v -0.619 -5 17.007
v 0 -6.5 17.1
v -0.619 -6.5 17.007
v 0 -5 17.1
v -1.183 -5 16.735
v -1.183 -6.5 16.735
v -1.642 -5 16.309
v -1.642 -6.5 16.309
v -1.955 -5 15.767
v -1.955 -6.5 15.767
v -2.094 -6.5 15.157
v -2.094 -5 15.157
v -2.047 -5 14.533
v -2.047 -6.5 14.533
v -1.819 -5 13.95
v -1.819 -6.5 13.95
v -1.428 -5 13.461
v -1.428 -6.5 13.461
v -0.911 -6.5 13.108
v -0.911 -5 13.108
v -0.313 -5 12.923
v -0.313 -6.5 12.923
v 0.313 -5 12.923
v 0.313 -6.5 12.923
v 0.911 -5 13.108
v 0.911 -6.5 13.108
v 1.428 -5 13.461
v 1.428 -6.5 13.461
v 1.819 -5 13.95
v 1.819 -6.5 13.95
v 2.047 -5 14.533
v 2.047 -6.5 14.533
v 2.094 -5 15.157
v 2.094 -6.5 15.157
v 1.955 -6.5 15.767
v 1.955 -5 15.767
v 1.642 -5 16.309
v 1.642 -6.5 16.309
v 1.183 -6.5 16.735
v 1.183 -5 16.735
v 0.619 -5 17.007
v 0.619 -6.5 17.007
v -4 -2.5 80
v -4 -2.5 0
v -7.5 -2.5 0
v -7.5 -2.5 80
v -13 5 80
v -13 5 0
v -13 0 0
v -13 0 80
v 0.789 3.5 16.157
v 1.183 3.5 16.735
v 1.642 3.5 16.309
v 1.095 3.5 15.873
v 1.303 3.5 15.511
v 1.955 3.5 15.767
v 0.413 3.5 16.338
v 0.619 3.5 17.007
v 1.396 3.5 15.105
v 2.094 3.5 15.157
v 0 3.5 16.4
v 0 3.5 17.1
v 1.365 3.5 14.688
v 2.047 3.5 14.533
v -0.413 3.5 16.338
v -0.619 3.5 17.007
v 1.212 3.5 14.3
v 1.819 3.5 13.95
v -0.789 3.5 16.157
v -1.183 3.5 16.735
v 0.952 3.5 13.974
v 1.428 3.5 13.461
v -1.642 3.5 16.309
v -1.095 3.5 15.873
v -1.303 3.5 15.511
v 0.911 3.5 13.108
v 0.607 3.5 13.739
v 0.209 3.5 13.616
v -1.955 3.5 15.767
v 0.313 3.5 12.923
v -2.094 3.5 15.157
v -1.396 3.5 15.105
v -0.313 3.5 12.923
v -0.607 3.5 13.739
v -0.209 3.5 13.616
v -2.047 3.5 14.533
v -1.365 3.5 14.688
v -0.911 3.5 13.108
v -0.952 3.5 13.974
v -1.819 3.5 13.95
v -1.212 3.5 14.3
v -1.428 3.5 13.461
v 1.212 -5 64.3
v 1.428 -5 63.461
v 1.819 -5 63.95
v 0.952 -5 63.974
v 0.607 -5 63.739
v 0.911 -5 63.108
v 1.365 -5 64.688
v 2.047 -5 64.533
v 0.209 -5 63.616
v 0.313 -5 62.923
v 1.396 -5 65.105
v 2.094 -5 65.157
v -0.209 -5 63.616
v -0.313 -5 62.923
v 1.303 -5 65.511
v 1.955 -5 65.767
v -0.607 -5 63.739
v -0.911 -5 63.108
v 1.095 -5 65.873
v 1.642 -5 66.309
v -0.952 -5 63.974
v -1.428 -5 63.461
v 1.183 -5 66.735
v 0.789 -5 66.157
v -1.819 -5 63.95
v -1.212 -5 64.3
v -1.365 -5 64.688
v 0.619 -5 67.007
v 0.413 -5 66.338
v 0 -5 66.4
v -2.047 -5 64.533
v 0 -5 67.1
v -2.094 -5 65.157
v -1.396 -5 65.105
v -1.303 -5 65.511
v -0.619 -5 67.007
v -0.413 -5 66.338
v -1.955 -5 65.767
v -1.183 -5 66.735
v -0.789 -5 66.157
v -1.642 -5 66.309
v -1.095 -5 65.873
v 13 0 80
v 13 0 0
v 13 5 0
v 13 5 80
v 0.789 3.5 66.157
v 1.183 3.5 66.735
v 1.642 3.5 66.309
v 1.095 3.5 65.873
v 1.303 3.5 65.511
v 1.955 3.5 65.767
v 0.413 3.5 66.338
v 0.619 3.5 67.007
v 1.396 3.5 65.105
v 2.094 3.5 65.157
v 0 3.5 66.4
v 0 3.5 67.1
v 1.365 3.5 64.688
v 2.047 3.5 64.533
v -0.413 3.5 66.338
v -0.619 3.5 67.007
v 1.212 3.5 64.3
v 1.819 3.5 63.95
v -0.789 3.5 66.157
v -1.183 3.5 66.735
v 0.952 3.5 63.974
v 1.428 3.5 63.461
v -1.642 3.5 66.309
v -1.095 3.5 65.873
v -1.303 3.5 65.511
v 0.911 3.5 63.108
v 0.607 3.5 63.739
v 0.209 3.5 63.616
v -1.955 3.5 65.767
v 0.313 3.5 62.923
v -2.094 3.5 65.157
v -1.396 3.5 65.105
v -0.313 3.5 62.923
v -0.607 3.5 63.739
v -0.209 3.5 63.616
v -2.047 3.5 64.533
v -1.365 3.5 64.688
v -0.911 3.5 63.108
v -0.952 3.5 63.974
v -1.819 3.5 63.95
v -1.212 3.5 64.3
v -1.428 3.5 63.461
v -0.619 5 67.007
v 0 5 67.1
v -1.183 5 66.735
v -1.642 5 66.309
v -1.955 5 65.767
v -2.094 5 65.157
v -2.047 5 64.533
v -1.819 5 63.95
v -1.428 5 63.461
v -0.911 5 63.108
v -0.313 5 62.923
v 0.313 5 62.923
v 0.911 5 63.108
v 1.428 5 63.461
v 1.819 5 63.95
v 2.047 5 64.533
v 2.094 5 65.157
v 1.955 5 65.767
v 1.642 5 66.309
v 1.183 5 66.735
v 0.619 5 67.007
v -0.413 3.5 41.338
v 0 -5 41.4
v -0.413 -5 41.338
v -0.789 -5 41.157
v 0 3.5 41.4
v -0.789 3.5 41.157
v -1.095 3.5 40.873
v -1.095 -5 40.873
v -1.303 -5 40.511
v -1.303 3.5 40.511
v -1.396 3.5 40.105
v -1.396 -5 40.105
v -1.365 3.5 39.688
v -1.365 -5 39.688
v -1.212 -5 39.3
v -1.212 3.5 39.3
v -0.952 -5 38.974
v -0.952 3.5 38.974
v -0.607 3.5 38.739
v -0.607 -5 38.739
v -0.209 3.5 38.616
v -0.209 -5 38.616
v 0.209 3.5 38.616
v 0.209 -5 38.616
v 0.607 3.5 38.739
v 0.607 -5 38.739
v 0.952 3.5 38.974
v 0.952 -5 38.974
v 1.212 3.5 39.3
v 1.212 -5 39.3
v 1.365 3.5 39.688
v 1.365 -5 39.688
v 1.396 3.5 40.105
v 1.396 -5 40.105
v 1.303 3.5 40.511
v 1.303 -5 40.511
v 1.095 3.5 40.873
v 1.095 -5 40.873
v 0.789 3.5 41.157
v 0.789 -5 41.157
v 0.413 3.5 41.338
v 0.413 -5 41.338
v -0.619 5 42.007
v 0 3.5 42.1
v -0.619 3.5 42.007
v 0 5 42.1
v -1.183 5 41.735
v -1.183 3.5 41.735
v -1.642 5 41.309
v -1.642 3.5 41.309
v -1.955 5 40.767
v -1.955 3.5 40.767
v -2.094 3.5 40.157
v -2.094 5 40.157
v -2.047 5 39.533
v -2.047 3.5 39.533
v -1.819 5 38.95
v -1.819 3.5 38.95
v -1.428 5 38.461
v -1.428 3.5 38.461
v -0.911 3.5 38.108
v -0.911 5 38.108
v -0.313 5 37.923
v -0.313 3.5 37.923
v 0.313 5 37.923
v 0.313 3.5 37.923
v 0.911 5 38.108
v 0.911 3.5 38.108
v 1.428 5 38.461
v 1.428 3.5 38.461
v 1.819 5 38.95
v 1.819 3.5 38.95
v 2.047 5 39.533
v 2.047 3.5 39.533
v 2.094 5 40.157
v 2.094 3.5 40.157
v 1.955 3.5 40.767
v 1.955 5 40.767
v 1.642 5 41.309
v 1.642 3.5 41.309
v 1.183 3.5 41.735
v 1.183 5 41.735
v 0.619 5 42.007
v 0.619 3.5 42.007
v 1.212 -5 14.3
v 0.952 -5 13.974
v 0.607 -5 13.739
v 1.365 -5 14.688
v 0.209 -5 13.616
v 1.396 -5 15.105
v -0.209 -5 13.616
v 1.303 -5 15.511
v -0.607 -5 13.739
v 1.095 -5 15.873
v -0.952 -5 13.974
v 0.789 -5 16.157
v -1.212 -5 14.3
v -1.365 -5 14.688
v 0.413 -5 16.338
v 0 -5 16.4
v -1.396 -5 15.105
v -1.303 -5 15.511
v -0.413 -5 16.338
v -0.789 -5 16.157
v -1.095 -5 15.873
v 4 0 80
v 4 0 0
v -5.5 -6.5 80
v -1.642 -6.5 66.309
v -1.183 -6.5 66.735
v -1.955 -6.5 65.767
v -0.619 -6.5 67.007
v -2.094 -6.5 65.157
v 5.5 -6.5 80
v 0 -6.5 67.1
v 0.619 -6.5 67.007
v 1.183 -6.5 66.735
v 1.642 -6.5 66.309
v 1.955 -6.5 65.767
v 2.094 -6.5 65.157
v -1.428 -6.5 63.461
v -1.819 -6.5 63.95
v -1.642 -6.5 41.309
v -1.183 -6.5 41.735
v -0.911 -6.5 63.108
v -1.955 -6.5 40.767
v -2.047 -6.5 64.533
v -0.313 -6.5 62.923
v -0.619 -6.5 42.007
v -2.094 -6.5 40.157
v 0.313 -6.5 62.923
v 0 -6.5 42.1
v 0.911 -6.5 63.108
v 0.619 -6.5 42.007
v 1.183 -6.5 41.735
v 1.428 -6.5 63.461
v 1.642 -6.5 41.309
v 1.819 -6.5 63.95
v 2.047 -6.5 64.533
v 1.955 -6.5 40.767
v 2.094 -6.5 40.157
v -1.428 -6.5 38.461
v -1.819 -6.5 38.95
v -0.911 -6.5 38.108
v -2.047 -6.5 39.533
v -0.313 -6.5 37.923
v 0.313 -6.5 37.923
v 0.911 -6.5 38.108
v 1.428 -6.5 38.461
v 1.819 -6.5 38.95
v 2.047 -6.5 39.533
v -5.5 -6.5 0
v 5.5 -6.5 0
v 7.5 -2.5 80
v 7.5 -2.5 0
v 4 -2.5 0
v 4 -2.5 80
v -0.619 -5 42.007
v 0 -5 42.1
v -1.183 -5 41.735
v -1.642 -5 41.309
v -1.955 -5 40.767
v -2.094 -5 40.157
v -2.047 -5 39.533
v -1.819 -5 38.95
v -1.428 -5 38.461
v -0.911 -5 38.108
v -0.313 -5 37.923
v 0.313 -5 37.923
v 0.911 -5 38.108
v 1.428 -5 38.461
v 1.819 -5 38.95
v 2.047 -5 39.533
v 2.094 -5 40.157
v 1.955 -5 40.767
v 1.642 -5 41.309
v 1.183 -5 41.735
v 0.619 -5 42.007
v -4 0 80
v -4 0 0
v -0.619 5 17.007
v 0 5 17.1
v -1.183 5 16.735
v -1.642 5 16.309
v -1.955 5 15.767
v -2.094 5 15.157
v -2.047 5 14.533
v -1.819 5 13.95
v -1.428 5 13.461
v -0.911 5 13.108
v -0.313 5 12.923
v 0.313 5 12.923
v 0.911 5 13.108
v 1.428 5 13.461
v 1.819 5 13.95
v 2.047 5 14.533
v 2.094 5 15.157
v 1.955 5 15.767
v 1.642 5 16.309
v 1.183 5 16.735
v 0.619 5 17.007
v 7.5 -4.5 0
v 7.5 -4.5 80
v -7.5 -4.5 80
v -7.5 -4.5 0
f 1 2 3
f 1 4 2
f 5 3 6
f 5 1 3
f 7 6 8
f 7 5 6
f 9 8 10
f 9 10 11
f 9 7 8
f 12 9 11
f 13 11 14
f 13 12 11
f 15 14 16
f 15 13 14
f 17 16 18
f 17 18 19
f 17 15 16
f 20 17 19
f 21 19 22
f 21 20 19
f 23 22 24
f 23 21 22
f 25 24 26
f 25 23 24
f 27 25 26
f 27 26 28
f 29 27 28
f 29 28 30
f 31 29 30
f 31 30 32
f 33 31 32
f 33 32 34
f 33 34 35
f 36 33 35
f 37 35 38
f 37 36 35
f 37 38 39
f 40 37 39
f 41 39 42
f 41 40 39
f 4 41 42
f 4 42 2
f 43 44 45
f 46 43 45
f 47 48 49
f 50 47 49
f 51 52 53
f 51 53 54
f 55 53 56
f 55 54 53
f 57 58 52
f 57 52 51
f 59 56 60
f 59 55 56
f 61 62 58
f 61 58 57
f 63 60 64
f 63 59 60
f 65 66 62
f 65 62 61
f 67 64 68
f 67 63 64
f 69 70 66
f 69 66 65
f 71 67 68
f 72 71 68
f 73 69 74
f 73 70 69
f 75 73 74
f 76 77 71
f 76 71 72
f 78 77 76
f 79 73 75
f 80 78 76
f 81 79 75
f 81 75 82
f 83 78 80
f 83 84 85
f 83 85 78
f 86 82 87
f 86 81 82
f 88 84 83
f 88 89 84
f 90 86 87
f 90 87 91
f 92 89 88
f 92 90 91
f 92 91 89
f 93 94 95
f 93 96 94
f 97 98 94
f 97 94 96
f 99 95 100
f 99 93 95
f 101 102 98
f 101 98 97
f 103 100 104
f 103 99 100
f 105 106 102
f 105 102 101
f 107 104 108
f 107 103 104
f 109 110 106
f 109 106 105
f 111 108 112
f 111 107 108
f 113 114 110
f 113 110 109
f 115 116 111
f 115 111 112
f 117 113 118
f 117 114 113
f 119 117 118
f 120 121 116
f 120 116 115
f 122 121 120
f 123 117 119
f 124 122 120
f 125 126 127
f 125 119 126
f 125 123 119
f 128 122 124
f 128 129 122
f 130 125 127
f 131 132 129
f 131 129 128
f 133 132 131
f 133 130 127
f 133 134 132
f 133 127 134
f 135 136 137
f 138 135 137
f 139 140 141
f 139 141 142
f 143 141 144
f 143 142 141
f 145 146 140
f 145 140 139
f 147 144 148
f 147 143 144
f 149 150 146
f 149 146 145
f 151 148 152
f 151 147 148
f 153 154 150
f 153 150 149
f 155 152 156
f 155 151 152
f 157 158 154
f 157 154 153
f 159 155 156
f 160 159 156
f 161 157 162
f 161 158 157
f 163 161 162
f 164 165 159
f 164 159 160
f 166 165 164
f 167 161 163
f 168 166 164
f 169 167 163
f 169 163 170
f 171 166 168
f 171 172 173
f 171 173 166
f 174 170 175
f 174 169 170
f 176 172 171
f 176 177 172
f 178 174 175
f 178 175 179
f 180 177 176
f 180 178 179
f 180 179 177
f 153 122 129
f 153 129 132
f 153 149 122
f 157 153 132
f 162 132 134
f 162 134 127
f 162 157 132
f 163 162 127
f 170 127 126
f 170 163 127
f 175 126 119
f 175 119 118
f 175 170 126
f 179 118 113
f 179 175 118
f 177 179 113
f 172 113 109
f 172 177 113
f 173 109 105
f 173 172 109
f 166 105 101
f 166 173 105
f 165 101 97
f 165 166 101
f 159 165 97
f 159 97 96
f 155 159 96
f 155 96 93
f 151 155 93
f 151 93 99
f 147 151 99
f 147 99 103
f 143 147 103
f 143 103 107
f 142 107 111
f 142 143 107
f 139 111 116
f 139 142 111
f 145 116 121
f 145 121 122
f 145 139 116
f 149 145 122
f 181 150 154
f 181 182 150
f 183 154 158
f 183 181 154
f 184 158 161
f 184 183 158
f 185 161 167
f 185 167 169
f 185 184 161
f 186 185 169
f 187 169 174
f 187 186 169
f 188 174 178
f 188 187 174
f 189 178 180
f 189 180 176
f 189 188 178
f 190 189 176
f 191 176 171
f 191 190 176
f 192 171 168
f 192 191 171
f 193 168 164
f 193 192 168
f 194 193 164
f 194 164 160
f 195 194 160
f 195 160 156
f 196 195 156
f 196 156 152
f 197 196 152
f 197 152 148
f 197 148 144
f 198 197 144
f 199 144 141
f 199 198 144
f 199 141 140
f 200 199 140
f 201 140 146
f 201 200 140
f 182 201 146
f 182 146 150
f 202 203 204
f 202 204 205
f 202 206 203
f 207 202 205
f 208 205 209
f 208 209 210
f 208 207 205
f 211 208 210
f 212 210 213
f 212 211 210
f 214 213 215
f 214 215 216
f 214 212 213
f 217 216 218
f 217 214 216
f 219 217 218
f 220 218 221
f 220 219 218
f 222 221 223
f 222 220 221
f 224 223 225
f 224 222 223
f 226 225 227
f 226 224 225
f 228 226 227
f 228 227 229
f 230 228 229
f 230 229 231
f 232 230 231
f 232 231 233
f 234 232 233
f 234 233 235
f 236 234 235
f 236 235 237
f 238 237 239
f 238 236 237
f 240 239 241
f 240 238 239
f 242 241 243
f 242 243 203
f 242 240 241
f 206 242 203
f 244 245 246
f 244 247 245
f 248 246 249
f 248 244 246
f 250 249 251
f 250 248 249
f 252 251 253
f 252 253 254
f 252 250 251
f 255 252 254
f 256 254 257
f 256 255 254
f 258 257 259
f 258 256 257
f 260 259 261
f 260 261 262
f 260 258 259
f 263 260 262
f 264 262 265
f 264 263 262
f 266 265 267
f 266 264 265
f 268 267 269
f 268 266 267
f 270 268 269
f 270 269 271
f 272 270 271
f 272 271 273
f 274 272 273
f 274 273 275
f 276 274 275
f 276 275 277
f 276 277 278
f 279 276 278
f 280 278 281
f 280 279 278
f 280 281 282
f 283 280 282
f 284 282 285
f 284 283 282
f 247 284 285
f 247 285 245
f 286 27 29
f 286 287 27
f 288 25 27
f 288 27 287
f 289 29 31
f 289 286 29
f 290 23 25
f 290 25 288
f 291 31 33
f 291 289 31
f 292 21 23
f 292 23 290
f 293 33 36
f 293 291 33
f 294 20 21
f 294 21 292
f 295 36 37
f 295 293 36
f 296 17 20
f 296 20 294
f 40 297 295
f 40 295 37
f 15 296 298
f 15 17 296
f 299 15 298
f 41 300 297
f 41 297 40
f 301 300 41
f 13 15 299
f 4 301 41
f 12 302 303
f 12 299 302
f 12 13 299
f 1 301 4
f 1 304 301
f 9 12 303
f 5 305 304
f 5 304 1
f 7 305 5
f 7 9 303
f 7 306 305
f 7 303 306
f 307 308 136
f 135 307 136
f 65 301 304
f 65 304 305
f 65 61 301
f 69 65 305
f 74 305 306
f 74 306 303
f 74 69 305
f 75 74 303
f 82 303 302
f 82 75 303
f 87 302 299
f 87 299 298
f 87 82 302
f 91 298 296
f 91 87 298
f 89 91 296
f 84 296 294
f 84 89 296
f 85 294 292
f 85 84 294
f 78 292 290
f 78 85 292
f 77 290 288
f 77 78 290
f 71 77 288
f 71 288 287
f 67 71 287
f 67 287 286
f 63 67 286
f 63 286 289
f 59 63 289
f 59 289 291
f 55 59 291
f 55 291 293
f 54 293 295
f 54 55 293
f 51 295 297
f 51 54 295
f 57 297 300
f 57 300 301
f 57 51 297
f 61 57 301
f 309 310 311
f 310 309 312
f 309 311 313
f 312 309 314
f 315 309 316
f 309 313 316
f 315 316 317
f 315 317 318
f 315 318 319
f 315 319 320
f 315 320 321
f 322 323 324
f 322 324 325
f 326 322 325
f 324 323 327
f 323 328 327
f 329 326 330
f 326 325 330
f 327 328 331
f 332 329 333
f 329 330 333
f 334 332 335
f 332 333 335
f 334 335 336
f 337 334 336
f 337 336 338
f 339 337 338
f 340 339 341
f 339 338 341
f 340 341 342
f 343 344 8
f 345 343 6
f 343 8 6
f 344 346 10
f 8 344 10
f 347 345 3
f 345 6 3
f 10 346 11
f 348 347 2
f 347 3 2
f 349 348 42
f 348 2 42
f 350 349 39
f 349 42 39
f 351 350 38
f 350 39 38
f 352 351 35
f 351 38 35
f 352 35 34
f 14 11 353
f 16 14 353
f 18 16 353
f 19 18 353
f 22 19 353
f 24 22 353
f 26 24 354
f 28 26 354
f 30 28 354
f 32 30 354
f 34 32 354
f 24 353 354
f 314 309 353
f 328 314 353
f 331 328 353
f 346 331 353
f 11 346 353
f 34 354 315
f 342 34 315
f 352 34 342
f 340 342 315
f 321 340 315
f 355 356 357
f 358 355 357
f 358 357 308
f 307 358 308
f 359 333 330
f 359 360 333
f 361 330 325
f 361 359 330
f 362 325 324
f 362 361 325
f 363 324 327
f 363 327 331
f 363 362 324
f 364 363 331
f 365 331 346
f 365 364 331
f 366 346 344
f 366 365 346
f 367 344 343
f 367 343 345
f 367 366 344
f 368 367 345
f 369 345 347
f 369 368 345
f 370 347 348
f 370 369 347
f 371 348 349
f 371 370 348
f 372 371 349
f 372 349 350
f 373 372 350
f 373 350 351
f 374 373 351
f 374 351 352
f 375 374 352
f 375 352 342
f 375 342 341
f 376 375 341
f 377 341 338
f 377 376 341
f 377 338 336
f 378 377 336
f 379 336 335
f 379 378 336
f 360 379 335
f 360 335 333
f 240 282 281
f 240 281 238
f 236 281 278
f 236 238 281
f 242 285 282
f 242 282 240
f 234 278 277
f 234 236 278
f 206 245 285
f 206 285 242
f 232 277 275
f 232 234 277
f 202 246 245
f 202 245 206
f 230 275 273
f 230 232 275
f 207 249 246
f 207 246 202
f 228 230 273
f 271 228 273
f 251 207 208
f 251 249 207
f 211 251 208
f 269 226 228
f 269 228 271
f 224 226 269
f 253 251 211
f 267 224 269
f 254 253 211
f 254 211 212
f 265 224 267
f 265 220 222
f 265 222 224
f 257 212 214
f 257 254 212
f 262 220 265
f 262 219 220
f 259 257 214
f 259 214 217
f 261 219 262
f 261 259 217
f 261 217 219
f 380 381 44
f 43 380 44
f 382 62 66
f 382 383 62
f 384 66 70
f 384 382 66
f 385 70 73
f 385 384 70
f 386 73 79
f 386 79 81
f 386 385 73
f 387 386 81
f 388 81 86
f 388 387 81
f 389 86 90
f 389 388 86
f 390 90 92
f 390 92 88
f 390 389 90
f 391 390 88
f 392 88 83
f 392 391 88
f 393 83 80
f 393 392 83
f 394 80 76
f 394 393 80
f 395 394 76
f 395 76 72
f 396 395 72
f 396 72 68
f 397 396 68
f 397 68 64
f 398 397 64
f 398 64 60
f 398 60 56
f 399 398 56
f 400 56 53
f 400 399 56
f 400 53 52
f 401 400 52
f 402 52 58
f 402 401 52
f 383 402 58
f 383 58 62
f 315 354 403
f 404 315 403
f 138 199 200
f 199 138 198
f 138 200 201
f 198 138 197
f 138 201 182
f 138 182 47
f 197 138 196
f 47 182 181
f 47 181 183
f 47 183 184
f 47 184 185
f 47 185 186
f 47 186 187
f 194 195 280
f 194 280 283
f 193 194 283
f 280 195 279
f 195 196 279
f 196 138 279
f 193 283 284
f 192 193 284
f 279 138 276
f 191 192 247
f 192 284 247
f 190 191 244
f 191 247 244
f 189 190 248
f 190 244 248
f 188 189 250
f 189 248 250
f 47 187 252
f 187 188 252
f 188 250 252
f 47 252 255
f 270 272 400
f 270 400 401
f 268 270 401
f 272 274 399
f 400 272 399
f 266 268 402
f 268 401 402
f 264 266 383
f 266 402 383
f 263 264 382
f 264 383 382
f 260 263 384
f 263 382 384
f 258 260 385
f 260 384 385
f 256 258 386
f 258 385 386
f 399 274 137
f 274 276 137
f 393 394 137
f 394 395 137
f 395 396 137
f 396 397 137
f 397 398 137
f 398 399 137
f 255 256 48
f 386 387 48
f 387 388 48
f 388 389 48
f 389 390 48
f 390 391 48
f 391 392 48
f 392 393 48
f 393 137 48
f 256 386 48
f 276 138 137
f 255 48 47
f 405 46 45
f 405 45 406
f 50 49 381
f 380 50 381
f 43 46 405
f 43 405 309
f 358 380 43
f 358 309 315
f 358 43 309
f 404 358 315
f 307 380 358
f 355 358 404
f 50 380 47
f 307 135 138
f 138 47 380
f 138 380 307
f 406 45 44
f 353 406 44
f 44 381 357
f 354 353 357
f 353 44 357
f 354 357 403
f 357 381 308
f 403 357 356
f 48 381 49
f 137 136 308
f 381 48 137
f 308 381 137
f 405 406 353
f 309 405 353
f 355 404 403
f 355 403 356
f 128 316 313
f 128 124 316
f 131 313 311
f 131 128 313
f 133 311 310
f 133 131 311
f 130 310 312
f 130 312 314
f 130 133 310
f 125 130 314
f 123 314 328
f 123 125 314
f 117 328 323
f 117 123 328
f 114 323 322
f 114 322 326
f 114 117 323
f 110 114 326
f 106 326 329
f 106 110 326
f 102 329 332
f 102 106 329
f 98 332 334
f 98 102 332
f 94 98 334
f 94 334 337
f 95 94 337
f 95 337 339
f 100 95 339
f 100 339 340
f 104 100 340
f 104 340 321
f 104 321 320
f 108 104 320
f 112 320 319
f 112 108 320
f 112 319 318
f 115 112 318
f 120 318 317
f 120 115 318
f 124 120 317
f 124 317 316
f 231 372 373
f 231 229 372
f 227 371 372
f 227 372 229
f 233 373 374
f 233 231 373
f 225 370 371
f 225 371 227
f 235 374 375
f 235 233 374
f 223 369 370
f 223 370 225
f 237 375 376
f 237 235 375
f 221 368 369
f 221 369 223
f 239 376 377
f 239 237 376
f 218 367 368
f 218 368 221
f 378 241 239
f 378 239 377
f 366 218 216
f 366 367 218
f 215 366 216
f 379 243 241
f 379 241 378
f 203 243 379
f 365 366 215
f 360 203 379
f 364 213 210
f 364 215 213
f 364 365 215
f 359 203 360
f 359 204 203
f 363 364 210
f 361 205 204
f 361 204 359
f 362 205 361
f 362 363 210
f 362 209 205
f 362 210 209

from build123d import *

# Parameters (mm, degrees)
EXTRUDE1_DEPTH                              = 80
CBORE_FOR_M5_HEX_HEAD_CAP_SCREW1_AT_2_COUNT = 2
CBORE_FOR_M5_HEX_HEAD_CAP_SCREW1_AT_2_PITCH = 25
CBORE_FOR_M5_HEX_HEAD_CAP_SCREW1_AT_3_COUNT = 2
CBORE_FOR_M5_HEX_HEAD_CAP_SCREW1_AT_3_PITCH = 50


with BuildPart() as part:
    # Sketch1 → Extrude1 (new body)
    with BuildSketch(Plane.XY):
        Polygon((-13, 0), (-4, 0), (-4, -2.5), (-7.5, -2.5), (-7.5, -4.5), (-5.5, -6.5), (5.5, -6.5), (7.5, -4.5), (7.5, -2.5), (4, -2.5), (4, 0), (13, 0), (13, 5), (-13, 5), align=None)
    extrude(amount=EXTRUDE1_DEPTH)

    # Sketch3 → CBORE for M5 Hex Head Cap Screw1 (revolve, cut)
    with BuildSketch(Plane(origin=(0, 5, 65), x_dir=(0, 0, 1), z_dir=(1, 0, 0))):
        Polygon((0, 0), (0, 11.5), (1.4, 11.5), (2.1, 11.5), (2.1, 10), (1.4, 10), (1.4, 1.5), (2.1, 1.5), (2.1, 0), align=None)
    cbore_for_m5_hex_head_cap_screw1 = revolve(axis=Axis((0, 11.35, 65), (0, -1, 0)), mode=Mode.SUBTRACT)

    # CBORE for M5 Hex Head Cap Screw1 at 2: CBORE for M5 Hex Head Cap Screw1 ×2
    with Locations(*[(0, 0, -i * CBORE_FOR_M5_HEX_HEAD_CAP_SCREW1_AT_2_PITCH) for i in range(1, CBORE_FOR_M5_HEX_HEAD_CAP_SCREW1_AT_2_COUNT)]):
        add(cbore_for_m5_hex_head_cap_screw1, mode=Mode.SUBTRACT)

    # CBORE for M5 Hex Head Cap Screw1 at 3: CBORE for M5 Hex Head Cap Screw1 ×2
    with Locations(*[(0, 0, -i * CBORE_FOR_M5_HEX_HEAD_CAP_SCREW1_AT_3_PITCH) for i in range(1, CBORE_FOR_M5_HEX_HEAD_CAP_SCREW1_AT_3_COUNT)]):
        add(cbore_for_m5_hex_head_cap_screw1, mode=Mode.SUBTRACT)


solid = part.part
